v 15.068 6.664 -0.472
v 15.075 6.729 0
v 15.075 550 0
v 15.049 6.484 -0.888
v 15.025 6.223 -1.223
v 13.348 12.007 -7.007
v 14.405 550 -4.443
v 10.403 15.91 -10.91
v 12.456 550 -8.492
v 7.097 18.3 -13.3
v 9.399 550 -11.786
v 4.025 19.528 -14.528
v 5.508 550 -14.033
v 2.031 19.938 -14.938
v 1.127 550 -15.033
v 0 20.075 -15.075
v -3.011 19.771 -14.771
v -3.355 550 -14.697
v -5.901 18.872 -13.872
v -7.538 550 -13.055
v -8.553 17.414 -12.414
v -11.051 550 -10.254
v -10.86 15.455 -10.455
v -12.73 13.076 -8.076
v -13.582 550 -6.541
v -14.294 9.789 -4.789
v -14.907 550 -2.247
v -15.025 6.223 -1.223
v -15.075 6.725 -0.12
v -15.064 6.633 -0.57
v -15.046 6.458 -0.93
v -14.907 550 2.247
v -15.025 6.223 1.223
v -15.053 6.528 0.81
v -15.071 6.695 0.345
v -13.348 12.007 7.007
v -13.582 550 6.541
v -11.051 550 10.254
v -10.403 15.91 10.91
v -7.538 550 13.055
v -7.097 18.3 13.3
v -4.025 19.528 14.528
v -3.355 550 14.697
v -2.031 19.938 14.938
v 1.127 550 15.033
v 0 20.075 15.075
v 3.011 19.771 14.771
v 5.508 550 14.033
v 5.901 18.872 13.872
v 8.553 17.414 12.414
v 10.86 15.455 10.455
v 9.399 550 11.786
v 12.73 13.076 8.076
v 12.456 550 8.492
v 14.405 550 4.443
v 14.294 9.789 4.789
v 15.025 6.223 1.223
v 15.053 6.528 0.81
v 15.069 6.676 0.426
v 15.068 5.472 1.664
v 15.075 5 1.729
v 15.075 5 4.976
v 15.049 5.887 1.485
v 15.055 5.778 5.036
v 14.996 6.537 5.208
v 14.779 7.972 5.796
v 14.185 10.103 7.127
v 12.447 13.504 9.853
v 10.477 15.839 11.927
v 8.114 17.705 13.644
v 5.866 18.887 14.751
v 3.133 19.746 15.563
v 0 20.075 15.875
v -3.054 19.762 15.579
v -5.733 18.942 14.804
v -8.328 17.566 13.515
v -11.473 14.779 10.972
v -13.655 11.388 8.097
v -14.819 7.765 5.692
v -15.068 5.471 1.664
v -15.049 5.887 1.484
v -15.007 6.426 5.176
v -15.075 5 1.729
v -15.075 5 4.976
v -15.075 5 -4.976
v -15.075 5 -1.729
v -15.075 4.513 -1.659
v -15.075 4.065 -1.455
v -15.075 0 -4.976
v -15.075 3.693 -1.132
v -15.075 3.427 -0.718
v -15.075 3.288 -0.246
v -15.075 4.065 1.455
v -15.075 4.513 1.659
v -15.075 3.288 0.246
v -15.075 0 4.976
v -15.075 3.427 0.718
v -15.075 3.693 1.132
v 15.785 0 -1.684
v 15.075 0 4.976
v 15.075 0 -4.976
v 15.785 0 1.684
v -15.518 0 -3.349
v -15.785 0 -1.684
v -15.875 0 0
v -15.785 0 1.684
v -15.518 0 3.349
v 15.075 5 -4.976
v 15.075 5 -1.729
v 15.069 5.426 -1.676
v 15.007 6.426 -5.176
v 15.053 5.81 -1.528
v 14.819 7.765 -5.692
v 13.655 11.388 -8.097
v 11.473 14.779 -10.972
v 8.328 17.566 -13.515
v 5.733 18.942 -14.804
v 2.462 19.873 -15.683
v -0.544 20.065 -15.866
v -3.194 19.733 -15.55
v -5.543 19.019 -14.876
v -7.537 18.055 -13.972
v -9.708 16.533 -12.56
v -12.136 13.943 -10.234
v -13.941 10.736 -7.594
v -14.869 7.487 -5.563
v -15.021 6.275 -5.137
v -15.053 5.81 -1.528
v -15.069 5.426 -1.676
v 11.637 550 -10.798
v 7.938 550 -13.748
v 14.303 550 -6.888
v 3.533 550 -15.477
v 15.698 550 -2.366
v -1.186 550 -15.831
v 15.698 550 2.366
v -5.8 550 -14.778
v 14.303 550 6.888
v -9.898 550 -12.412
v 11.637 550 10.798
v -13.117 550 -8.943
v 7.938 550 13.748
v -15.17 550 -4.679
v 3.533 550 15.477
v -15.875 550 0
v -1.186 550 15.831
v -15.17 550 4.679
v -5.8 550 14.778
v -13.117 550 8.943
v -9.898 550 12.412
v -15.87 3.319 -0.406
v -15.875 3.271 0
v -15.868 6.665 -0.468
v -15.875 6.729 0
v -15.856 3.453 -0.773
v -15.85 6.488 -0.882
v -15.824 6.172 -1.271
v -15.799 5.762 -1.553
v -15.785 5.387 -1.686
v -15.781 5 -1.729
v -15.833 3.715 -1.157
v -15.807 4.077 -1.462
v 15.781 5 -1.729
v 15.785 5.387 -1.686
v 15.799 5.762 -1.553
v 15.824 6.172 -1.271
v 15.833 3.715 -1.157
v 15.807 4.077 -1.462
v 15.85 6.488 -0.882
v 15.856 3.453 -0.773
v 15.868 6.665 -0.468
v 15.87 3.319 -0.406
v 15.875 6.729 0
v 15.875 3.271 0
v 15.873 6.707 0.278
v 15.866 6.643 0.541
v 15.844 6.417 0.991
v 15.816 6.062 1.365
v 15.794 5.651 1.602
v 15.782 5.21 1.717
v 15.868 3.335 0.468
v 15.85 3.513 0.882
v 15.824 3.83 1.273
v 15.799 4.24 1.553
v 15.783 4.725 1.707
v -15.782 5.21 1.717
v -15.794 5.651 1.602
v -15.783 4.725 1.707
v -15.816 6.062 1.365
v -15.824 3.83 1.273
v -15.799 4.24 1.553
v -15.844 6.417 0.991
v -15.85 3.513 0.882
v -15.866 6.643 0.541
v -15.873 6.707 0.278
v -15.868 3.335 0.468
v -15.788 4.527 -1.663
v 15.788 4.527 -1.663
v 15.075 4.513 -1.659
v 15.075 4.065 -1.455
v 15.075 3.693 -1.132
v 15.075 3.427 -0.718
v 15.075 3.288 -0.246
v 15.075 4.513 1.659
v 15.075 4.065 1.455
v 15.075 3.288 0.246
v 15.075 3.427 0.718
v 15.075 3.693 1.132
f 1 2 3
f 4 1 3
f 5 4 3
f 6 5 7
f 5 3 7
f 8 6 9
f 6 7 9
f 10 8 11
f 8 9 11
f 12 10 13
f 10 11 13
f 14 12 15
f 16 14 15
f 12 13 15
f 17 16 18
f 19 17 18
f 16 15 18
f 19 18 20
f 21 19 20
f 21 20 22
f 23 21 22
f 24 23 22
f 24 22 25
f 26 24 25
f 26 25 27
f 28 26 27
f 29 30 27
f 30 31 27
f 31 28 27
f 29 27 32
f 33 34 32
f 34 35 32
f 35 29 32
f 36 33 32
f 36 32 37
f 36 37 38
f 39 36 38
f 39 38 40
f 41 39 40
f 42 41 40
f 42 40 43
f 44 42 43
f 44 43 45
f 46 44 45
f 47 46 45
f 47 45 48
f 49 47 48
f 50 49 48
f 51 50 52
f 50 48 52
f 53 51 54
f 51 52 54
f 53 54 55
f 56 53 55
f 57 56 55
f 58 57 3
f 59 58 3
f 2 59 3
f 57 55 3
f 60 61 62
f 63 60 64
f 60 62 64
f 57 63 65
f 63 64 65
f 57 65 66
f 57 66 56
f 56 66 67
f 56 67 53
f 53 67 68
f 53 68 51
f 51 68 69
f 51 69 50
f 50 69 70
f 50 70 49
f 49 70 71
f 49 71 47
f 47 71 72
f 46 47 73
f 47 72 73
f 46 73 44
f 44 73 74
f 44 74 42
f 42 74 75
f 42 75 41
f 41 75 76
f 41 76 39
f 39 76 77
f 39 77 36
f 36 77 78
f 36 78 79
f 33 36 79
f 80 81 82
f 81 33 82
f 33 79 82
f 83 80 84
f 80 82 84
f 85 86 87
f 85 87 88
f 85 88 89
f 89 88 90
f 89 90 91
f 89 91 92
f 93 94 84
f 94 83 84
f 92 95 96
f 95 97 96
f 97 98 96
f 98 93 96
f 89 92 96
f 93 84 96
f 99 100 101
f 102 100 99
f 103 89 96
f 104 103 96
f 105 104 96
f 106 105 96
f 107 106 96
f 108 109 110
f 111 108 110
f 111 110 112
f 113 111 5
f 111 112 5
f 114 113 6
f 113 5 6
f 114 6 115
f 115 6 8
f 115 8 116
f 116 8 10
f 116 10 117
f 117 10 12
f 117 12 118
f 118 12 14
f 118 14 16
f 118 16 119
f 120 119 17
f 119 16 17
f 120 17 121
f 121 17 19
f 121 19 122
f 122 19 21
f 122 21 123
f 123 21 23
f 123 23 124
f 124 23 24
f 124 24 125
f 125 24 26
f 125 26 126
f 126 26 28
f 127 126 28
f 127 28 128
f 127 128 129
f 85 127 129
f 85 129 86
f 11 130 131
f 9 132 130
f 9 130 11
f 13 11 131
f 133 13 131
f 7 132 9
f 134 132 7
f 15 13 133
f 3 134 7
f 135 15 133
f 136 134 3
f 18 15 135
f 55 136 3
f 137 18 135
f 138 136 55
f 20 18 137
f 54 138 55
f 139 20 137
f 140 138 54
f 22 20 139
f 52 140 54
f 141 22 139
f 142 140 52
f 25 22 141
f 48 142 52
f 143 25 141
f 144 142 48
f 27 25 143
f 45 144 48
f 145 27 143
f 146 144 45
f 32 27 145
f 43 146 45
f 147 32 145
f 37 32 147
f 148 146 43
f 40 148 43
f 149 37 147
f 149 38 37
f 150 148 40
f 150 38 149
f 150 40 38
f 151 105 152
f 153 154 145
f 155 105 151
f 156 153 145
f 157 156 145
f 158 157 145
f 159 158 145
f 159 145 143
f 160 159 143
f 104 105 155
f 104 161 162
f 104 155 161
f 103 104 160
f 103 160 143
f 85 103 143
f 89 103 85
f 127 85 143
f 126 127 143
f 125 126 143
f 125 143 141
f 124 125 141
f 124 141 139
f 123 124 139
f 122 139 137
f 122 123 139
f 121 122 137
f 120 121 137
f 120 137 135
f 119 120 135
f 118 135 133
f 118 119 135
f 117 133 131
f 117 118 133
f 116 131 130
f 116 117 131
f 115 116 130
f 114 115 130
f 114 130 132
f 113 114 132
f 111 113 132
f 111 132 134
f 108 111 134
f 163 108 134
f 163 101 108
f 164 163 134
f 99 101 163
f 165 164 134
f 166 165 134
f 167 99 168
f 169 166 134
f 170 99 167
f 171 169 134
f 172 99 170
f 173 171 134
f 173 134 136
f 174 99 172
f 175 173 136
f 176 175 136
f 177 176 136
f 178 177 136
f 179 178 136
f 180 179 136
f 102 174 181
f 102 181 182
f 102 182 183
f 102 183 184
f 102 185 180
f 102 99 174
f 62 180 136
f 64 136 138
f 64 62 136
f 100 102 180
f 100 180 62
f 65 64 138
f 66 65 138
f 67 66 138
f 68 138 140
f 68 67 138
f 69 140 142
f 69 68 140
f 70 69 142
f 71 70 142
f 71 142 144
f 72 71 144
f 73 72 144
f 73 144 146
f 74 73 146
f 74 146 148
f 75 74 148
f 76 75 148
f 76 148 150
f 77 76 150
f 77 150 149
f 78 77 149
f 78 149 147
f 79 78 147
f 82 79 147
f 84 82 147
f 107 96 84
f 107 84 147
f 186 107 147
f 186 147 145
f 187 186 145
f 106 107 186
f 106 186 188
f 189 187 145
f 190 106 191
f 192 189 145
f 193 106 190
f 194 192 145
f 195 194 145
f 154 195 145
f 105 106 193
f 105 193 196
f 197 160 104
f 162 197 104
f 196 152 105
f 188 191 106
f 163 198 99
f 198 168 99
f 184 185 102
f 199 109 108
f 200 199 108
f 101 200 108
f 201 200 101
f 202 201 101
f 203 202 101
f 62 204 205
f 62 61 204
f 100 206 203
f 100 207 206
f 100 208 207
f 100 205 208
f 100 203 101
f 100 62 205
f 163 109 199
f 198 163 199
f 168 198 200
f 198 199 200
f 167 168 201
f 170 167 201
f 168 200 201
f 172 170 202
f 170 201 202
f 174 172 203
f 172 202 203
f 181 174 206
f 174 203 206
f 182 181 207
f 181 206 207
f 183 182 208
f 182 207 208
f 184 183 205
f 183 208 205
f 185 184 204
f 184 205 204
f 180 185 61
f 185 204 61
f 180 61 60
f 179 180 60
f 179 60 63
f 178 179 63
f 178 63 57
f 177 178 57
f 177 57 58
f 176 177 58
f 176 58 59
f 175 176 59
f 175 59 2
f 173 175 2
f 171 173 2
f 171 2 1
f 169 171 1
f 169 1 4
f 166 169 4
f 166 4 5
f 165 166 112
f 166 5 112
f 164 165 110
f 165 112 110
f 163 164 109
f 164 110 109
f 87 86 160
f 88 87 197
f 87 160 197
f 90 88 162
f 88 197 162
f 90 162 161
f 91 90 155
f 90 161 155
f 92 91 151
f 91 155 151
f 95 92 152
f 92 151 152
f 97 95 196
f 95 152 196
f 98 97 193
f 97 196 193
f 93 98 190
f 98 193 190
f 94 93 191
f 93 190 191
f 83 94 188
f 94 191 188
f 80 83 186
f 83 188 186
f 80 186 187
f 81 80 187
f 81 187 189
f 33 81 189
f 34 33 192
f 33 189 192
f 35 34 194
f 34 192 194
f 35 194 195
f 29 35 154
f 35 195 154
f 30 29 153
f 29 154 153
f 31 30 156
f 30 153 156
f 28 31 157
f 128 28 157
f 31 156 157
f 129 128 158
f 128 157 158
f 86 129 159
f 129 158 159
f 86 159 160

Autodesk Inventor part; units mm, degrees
ref_plane "YZ Plane" through (0, 0, 0) normal (1, 0, 0) x (0, 1, 0)
sketch "Sketch1" plane through (0, 0, 0) normal (0, 1, 0) x (-1, 0, 0)
  circle A0 centre (0, 0) radius 15.875
  dimension "d0" = 31.75
extrude "Extrusion1" add sketch "Sketch1" along normal blind 550
sketch "Sketch7" plane through (0, 550, 0) normal (0, 1, 0) x (1, 0, 0)
  circle A0 centre (0, 0) radius 15.075
  dimension "d23" = 30.15
extrude "Extrusion3" cut sketch "Sketch7" against normal through all
sketch "Sketch8" plane through (0, 0, 0) normal (0, -1, 0) x (1, 0, 0)
  circle A0 centre (0, 0) radius 15.875 projected
  point P0 (0, 15.875)
ref_plane "Work Plane3" through (0, 0, 15.875) normal (0, 0, 1) x (1, 0, 0)
sketch "Sketch9" plane through (0, 0, 15.875) normal (0, 0, 1) x (1, 0, 0)
  arc A0 (15.075, 5) -> (-15.075, 5) centre (0, 5) ccw
  line L0 (-15.075, 5) -> (-15.075, 0)
  line L1 (15.875, 0) -> (-15.875, 0) projected
  line L2 (15.075, 5) -> (15.075, 0)
  point P0 (0, 0)
  dimension "d26" = 5
  dimension "d27" = 30.15
extrude "Extrusion4" cut sketch "Sketch9" against normal through all
sketch "Sketch10" plane through (0, 0, 0) normal (0, -1, 0) x (1, 0, 0)
  circle A0 centre (0, 0) radius 15.875 projected
  point P0 (15.875, 0)
ref_plane "Work Plane4" through (15.875, 0, 0) normal (1, 0, 0) x (0, 1, 0)
sketch "Sketch11" plane through (15.875, 0, 0) normal (1, 0, 0) x (0, 1, 0)
  line L0 (0, -4.9759) -> (0, 4.9759) projected
  point P0 (0, 0)
  point P1 (5, 0)
  point P2 (0, 0)
  dimension "d30" = 5
hole "Hole3" at (15.875, 5, 0) direction (-1, 0, 0) diameter 3.4587 end through all thread size "M4x0.5" class "6H" standard "ISO Metric profile"
equation "\"d36\" = Thickness"
equation "\"BendRadius\" = Thickness"
equation "\"BendReliefWidth\" = Thickness"
equation "\"BendReliefDepth\" = 0.5 * Thickness"
equation "\"CornerReliefSize\" = 4 * Thickness"
equation "\"MinimumRemnant\" = 2 * Thickness"
equation "\"TransitionRadius\" = BendRadius"
equation "\"JacobiRadiusSize\" = BendRadius"
equation "\"GapSize\" = Thickness"
equation "\"Thickness\" = 0.5"
properties part number "Output link body_ final"
